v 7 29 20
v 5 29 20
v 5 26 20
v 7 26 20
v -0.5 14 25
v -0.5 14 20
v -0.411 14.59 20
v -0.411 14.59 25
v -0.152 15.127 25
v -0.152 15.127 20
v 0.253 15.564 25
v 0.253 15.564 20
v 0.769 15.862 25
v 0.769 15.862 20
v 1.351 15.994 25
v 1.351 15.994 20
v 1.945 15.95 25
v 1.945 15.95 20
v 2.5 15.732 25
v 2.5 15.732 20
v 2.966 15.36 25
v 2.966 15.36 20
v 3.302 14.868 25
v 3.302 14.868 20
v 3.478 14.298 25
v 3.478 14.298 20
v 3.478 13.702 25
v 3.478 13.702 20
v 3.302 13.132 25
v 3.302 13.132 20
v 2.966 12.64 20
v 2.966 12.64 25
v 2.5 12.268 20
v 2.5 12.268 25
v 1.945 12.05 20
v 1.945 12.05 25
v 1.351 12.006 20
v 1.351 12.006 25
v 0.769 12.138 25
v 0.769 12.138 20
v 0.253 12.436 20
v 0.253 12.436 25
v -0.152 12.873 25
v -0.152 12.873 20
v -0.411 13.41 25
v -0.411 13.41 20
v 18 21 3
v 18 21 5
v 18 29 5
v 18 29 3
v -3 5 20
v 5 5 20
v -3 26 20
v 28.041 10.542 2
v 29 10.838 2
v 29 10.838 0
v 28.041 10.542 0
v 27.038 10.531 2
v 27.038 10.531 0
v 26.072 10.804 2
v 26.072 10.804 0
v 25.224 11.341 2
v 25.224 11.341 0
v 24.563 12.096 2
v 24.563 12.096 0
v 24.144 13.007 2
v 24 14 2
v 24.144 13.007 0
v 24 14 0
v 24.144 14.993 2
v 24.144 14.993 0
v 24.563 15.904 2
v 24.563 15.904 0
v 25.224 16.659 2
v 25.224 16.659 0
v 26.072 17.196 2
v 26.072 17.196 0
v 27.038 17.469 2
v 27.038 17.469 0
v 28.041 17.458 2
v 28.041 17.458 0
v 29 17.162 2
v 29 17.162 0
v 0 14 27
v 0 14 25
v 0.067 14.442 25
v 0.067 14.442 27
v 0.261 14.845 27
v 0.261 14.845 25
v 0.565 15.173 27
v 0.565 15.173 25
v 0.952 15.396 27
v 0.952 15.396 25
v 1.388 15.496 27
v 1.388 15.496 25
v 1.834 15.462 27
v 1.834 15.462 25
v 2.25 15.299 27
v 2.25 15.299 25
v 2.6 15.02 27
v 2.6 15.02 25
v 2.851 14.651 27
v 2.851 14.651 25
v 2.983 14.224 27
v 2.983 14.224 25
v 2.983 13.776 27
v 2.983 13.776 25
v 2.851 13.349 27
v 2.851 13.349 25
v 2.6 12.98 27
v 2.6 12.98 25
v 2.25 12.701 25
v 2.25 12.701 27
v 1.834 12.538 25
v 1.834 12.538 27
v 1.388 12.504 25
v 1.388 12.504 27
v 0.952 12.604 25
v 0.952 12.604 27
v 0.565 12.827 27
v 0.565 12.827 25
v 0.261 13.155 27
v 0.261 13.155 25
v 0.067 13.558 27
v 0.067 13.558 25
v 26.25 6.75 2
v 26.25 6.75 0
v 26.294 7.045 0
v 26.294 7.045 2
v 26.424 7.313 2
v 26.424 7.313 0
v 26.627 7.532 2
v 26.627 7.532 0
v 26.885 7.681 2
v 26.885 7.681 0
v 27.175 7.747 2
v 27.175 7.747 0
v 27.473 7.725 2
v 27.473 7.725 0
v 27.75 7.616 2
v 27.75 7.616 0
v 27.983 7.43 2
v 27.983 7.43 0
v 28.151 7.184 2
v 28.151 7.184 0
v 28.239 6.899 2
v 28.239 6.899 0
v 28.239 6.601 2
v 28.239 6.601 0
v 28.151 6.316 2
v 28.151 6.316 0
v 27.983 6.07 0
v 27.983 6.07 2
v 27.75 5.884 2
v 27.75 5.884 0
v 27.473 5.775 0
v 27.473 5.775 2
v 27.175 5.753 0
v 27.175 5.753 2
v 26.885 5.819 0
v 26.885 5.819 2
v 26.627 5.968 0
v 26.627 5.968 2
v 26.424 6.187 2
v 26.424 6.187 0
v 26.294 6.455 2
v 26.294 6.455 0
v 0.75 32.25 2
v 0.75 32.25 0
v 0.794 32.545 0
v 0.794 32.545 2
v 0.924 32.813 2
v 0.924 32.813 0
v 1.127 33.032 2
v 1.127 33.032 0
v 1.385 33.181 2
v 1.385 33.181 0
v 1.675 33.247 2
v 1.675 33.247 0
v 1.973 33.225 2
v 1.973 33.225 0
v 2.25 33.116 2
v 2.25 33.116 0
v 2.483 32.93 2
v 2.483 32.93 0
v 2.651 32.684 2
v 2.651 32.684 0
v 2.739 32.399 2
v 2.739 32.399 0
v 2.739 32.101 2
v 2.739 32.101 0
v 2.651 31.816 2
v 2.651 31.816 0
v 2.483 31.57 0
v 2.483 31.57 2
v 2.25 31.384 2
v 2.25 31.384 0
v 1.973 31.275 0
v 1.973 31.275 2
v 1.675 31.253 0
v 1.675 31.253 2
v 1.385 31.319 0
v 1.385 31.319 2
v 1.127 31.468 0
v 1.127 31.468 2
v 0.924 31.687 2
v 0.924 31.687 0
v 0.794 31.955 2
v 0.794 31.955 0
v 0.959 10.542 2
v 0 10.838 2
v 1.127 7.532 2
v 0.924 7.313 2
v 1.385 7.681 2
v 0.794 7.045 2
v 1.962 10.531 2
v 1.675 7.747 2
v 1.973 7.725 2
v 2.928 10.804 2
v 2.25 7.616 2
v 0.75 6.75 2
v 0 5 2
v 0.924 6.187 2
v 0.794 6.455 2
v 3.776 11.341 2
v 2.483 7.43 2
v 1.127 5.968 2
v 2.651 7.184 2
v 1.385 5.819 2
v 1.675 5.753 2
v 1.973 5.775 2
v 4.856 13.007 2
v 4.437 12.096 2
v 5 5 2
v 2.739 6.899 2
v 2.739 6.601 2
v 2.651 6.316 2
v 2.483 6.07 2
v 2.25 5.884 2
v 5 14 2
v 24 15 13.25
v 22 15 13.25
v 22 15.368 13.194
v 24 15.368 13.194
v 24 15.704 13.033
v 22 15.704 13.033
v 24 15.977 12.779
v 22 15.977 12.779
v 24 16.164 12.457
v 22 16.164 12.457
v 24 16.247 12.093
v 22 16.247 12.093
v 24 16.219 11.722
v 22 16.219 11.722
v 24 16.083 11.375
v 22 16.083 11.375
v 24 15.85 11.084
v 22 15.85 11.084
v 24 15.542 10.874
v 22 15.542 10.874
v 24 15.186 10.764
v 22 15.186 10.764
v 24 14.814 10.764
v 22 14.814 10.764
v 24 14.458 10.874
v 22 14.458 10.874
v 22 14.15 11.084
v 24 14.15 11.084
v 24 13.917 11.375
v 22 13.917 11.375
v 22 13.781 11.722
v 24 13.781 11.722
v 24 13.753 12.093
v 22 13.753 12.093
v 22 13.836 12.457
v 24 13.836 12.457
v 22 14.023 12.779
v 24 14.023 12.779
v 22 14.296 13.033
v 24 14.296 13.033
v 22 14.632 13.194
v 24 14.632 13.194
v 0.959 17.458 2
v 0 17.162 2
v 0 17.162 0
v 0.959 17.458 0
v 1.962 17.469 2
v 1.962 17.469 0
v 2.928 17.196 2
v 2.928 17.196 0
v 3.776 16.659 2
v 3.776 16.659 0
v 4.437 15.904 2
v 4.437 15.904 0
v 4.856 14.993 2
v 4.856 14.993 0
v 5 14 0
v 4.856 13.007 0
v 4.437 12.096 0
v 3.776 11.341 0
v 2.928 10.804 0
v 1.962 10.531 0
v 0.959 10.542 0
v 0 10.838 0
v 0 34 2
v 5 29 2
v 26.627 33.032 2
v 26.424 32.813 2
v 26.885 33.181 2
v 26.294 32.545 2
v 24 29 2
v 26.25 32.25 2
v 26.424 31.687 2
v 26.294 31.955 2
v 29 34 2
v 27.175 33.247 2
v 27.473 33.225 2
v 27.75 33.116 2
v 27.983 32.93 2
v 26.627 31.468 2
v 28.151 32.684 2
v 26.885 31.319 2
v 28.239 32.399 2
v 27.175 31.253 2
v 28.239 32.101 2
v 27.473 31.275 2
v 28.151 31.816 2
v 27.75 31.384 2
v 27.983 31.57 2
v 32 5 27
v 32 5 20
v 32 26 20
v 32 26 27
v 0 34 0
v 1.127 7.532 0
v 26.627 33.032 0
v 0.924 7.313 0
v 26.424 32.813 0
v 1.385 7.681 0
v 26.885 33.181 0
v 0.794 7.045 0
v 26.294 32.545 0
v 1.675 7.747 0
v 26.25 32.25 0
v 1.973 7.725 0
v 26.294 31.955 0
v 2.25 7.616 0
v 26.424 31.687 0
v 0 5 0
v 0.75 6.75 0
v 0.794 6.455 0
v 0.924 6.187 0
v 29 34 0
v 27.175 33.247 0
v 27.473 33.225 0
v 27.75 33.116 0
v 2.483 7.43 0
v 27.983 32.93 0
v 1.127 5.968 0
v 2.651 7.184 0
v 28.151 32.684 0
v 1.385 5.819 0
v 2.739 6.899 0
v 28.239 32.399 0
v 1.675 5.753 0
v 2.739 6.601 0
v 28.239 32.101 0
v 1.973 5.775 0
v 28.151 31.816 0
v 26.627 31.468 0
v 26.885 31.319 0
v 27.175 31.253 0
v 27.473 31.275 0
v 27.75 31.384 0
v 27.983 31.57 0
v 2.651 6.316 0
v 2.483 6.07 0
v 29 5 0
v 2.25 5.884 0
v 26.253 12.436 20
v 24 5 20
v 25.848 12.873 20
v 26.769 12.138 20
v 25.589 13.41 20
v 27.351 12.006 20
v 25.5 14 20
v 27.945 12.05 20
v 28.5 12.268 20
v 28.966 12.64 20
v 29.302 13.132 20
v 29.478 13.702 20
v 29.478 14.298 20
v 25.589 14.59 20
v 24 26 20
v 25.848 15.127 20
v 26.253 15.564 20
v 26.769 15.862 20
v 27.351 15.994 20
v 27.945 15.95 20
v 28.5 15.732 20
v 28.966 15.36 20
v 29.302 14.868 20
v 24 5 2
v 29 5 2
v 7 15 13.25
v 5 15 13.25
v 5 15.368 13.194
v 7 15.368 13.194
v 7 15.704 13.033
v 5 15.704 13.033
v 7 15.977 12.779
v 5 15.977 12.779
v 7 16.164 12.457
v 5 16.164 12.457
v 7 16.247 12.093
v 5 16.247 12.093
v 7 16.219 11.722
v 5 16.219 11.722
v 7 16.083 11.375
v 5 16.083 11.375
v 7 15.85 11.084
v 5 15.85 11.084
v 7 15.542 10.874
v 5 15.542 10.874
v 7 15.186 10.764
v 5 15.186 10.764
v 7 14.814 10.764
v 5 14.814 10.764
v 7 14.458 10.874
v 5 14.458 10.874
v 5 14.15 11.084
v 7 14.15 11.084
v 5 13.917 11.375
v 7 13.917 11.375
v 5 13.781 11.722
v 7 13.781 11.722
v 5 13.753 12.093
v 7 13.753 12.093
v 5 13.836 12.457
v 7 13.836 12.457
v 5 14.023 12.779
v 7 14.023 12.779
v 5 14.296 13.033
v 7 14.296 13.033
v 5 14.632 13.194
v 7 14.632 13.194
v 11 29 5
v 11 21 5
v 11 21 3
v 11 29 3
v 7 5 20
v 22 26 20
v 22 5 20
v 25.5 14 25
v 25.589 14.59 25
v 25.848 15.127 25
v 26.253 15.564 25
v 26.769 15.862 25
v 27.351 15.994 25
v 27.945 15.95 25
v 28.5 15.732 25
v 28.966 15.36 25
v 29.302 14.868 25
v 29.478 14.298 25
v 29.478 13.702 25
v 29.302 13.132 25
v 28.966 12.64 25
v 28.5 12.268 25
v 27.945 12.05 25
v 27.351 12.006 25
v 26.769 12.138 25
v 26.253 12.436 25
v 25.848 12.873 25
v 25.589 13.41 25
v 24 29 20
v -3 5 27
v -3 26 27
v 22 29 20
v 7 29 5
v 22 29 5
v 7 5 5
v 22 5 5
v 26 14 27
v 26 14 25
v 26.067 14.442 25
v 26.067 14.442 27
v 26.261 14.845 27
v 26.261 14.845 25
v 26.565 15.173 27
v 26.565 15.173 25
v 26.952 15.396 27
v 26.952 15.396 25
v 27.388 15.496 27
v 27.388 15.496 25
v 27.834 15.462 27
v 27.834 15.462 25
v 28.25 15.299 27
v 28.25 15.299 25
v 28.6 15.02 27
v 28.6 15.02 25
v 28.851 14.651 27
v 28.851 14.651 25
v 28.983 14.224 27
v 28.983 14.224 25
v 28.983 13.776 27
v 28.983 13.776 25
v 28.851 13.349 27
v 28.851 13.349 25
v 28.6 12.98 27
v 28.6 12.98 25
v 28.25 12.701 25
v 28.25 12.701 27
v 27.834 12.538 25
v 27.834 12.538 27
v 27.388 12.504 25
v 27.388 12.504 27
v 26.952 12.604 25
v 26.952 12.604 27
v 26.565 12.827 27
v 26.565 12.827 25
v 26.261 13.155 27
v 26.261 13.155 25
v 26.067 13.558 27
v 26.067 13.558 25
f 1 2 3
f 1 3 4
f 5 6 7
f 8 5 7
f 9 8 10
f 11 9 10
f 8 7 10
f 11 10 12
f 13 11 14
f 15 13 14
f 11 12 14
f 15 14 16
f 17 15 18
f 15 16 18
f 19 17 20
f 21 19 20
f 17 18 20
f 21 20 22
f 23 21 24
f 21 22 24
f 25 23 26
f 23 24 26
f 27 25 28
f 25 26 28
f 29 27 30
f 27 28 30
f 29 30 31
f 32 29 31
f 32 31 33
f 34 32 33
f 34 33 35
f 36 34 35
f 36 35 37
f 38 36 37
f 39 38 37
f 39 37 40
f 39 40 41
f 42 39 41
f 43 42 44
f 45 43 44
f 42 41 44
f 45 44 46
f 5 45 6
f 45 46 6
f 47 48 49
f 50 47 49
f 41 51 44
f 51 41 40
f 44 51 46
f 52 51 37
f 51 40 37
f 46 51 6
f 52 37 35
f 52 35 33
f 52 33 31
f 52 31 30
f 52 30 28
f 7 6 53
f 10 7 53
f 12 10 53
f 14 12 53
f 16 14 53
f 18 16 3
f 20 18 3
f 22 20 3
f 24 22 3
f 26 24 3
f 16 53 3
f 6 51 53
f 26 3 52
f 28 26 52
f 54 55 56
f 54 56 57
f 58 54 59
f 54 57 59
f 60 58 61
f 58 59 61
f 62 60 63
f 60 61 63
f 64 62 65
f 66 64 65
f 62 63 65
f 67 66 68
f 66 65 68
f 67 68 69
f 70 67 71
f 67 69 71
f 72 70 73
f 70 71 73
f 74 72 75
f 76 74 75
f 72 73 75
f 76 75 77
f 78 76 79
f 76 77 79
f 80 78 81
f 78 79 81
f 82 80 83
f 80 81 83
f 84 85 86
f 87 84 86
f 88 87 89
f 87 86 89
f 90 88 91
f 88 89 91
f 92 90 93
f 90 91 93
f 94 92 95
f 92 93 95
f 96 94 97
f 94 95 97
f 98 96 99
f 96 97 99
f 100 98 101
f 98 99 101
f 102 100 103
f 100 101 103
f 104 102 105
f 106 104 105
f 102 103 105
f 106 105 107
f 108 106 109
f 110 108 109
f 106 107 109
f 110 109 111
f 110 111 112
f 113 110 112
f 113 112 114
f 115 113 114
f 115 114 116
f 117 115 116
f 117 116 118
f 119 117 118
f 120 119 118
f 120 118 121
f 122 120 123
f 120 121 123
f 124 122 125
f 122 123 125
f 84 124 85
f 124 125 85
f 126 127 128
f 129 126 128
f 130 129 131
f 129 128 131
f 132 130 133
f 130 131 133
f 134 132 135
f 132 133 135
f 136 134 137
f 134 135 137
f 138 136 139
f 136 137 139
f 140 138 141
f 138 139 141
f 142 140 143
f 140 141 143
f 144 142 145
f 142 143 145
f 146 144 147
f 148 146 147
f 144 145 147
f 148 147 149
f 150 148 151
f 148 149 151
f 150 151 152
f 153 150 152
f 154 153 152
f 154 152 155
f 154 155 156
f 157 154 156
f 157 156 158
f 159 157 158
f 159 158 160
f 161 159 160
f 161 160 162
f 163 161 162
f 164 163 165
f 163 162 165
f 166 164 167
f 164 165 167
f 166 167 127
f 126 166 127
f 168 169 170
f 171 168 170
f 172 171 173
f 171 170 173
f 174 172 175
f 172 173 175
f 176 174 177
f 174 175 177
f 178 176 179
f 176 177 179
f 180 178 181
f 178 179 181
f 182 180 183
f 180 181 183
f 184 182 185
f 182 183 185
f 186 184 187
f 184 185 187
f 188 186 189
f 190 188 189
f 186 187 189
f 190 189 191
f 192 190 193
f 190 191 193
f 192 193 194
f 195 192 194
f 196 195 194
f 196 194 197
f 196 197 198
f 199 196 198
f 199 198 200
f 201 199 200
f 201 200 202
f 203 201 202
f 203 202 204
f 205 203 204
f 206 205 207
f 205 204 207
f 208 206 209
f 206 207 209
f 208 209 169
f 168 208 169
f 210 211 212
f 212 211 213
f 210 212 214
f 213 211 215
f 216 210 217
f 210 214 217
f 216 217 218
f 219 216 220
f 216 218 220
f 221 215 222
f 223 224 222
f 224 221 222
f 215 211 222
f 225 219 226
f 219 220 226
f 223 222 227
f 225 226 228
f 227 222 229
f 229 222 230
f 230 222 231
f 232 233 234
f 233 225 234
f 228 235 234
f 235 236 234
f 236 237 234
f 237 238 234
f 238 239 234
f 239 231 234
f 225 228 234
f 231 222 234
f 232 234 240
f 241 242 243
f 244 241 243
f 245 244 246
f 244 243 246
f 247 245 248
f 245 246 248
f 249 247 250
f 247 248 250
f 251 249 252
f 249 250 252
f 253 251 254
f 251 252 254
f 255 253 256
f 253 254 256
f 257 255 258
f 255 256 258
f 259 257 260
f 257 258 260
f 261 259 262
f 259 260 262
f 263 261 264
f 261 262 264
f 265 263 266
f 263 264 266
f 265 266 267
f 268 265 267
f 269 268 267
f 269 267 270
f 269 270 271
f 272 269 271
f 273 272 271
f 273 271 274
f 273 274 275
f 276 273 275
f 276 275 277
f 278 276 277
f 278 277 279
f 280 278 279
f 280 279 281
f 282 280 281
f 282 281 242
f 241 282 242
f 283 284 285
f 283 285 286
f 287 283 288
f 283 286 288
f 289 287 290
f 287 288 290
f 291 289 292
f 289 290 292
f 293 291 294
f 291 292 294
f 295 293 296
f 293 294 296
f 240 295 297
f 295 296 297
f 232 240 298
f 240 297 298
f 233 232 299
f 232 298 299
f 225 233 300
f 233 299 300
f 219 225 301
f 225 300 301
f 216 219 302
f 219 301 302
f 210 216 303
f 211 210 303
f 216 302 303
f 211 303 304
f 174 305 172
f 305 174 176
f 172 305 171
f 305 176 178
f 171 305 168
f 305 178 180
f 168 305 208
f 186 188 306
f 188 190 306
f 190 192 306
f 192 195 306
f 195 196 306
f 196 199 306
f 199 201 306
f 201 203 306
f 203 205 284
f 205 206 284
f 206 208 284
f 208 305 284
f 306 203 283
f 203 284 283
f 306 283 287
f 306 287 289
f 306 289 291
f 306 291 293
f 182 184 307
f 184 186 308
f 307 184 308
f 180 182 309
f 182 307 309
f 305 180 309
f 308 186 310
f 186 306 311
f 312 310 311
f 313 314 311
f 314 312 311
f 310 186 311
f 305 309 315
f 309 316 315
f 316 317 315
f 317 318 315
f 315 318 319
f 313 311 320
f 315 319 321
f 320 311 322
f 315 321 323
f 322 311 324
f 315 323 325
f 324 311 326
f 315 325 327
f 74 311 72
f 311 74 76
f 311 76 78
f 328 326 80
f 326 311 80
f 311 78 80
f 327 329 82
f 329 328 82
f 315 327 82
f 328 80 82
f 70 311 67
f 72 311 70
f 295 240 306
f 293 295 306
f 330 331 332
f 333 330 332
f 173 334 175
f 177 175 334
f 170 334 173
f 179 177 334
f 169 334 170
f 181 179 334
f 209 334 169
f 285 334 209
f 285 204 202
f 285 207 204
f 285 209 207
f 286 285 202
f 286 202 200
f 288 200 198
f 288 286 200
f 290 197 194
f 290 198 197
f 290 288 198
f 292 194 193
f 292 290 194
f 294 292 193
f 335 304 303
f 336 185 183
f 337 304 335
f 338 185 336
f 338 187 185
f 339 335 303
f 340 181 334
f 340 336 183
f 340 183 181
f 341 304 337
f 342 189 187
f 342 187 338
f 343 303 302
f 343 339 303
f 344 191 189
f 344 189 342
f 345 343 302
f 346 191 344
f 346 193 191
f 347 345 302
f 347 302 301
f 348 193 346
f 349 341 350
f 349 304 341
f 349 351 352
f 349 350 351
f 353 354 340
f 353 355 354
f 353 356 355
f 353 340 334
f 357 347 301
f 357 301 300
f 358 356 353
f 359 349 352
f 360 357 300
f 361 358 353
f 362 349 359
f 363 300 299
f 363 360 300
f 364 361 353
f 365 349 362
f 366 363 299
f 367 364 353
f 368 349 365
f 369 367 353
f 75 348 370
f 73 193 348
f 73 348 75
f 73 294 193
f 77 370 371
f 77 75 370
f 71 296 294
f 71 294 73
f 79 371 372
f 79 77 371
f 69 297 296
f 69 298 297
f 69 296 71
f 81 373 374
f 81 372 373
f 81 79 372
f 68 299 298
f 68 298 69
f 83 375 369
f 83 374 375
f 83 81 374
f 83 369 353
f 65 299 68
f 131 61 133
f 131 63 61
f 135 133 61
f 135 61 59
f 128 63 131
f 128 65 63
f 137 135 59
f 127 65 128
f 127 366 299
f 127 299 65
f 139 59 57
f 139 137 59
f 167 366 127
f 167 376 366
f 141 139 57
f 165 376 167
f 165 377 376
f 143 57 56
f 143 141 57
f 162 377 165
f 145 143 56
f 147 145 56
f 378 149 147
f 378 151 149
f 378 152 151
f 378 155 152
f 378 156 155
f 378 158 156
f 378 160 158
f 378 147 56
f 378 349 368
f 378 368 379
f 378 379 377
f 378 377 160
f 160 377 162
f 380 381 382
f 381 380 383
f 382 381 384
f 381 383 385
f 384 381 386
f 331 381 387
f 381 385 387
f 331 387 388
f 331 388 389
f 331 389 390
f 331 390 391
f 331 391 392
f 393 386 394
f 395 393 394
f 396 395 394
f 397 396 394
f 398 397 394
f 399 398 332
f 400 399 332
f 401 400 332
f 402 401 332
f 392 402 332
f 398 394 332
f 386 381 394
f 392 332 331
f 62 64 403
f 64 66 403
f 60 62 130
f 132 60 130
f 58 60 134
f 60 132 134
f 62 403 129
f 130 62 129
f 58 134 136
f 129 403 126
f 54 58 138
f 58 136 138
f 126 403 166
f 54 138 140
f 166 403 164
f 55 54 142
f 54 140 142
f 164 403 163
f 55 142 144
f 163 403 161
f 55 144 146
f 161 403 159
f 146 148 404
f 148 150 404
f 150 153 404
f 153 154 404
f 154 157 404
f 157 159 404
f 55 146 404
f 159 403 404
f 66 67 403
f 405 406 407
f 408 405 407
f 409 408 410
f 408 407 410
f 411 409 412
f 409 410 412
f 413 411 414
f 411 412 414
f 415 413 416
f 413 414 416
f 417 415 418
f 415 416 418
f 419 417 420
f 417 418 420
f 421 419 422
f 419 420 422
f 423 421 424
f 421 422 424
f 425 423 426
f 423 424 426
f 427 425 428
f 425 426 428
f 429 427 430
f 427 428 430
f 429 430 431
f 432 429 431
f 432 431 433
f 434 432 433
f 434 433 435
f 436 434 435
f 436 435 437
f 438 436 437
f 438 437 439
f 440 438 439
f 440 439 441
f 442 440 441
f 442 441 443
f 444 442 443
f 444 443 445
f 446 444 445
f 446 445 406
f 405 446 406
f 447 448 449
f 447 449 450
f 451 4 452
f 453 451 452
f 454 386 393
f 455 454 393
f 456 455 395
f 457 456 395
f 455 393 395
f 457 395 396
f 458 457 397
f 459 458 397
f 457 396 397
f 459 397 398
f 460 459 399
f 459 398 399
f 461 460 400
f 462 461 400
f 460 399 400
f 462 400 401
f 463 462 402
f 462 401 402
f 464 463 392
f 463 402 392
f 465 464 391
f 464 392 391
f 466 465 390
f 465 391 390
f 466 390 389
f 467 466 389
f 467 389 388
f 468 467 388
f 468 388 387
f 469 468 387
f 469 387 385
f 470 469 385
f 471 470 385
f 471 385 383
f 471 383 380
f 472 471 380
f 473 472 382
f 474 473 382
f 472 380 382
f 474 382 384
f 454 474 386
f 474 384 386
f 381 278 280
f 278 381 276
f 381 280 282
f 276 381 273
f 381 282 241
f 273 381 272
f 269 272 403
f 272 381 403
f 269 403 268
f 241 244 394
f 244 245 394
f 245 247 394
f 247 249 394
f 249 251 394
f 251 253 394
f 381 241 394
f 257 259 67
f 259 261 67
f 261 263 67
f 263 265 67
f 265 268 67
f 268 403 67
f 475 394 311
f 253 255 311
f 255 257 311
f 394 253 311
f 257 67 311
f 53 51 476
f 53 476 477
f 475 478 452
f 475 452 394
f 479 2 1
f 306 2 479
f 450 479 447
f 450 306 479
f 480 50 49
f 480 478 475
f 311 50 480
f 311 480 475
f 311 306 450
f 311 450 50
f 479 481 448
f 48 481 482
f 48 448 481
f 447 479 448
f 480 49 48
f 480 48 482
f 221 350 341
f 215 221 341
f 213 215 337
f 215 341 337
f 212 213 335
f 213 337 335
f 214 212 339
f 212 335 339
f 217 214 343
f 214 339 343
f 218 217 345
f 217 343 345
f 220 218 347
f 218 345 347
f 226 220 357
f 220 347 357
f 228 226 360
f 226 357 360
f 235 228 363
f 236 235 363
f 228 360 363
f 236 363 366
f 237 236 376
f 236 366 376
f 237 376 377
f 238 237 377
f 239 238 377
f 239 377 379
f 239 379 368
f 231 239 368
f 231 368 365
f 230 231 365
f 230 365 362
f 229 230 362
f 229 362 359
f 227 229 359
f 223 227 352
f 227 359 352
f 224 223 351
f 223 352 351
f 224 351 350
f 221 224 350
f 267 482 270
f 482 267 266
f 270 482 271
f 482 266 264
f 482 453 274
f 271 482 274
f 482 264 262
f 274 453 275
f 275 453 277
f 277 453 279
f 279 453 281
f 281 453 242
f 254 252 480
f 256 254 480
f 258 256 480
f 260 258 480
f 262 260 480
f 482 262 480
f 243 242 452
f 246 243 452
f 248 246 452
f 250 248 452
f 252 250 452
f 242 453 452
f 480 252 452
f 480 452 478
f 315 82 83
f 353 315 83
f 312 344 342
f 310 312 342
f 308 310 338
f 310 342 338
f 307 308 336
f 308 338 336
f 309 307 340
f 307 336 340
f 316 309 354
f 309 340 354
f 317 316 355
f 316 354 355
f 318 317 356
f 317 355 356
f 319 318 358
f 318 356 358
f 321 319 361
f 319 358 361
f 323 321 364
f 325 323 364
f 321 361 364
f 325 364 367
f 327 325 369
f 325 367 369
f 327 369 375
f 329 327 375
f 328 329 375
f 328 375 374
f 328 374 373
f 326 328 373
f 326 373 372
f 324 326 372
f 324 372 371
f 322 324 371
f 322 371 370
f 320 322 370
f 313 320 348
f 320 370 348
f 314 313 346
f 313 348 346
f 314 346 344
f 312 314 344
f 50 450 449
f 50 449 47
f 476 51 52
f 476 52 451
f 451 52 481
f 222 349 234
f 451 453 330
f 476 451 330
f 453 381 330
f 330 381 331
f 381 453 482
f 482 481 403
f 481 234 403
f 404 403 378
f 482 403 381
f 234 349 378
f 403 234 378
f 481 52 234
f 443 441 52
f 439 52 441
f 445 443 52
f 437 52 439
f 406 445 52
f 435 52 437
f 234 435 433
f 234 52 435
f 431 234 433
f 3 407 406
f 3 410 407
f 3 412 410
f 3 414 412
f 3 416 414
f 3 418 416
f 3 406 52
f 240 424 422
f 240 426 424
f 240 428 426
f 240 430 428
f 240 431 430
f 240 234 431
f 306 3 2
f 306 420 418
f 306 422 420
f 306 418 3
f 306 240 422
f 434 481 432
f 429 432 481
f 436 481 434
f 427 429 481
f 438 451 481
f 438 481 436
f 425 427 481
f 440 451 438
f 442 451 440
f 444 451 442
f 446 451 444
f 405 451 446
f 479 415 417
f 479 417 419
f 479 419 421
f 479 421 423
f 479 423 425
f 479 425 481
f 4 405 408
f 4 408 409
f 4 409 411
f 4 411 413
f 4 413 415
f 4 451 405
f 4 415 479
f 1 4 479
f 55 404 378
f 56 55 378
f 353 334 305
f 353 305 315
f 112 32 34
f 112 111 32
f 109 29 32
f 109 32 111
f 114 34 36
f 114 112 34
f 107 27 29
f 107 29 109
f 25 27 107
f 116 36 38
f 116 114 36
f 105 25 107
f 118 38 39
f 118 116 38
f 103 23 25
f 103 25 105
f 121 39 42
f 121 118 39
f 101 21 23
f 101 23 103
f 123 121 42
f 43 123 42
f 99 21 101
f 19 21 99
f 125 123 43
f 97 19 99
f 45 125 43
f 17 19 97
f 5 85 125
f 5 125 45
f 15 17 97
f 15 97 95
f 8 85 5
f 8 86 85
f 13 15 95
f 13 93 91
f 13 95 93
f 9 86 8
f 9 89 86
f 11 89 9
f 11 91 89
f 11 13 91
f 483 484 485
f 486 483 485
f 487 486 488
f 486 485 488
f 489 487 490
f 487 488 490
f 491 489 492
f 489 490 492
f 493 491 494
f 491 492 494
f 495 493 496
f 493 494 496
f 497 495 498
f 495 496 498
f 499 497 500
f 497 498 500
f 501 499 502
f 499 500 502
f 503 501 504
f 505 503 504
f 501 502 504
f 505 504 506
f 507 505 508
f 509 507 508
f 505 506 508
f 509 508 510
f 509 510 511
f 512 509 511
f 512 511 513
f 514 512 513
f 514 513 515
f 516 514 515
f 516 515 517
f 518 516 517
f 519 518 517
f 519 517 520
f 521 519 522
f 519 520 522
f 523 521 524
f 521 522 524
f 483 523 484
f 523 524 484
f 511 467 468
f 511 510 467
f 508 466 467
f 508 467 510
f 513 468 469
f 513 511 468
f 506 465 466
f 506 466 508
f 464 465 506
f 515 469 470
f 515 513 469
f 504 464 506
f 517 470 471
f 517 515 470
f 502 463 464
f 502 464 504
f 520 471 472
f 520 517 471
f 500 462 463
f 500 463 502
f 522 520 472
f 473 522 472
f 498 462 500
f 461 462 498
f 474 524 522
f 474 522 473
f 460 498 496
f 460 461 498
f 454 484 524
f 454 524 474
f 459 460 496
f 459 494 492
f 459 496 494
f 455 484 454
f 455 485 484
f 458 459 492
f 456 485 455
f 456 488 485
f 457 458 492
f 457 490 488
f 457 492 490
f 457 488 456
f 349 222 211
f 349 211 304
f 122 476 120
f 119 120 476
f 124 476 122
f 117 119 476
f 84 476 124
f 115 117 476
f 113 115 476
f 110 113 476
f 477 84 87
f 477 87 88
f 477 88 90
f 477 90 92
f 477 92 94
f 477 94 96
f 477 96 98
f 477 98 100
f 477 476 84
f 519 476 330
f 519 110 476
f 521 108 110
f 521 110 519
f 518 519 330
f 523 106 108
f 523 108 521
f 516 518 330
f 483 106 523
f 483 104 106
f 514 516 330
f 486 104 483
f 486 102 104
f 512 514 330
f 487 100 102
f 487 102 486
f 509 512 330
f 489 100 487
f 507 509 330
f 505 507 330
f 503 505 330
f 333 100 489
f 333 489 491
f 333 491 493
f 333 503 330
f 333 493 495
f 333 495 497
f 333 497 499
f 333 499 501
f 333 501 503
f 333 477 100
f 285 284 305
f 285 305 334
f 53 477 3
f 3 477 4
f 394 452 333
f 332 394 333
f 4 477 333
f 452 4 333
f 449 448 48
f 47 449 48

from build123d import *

# Parameters (mm, degrees)
AUFSATZ_LINEAR_AUSTRAGEN1_OUTLINE_W = 29
AUFSATZ_LINEAR_AUSTRAGEN1_OUTLINE_H = 29
AUFSATZ_LINEAR_AUSTRAGEN1_DEPTH     = 2
SKIZZE2_W                           = 19
SKIZZE2_H                           = 24
AUFSATZ_LINEAR_AUSTRAGEN2_DEPTH     = 18
SKIZZE5_W                           = 15
SKIZZE5_H                           = 24
SCHNITT_LINEAR_AUSTRAGEN2_DEPTH     = 15
SCHNITT_LINEAR_AUSTRAGEN3_REACH     = 44.626
SKIZZE4_R                           = 1.25
SKIZZE6_W                           = 35
SKIZZE6_H                           = 24
AUFSATZ_LINEAR_AUSTRAGEN3_DEPTH     = 7
SKIZZE9_R                           = 2
SCHNITT_LINEAR_AUSTRAGEN4_DEPTH     = 5
SKIZZE19_W                          = 17
SKIZZE19_H                          = 5
SCHNITT_LINEAR_AUSTRAGEN15_DEPTH    = 2
SKIZZE20_R                          = 1.5
SCHNITT_LINEAR_AUSTRAGEN16_DEPTH    = 2
SKIZZE21_W                          = 7
SKIZZE21_H                          = 8
SCHNITT_LINEAR_AUSTRAGEN17_DEPTH    = 2
SKIZZE23_W                          = 6.5
SKIZZE23_H                          = 5
SKIZZE23_W_2                        = 5.5
SCHNITT_LINEAR_AUSTRAGEN18_DEPTH    = 2
SKIZZE24_W                          = 29
SKIZZE24_H                          = 2
AUFSATZ_LINEAR_AUSTRAGEN4_DEPTH     = 5
SKIZZE25_R                          = 1
SCHNITT_LINEAR_AUSTRAGEN19_DEPTH    = 2
SKIZZE26_W                          = 35
SKIZZE26_H                          = 3
SCHNITT_LINEAR_AUSTRAGEN20_DEPTH    = 7
SKIZZE27_R                          = 3.5
SCHNITT_LINEAR_AUSTRAGEN21_DEPTH    = 2


# Read off the part's stored shape, not the designer's step: Aufsatz-Linear austragen1
with BuildPart() as part:
    # Aufsatz-Linear austragen1 outline → Aufsatz-Linear austragen1 (new body)
    with BuildSketch(Plane.XY):
        with Locations((14.5, 14.5)):
            Rectangle(AUFSATZ_LINEAR_AUSTRAGEN1_OUTLINE_W, AUFSATZ_LINEAR_AUSTRAGEN1_OUTLINE_H)
    extrude(amount=AUFSATZ_LINEAR_AUSTRAGEN1_DEPTH)

    # Skizze2 → Aufsatz-Linear austragen2 (add)
    with BuildSketch(Plane.XY.offset(2)):
        with Locations((14.5, 17)):
            Rectangle(SKIZZE2_W, SKIZZE2_H)
    extrude(amount=AUFSATZ_LINEAR_AUSTRAGEN2_DEPTH)

    # Skizze5 → Schnitt-Linear austragen2 (cut)
    with BuildSketch(Plane.XY.offset(20)):
        with Locations((14.5, 17)):
            Rectangle(SKIZZE5_W, SKIZZE5_H)
    extrude(amount=-SCHNITT_LINEAR_AUSTRAGEN2_DEPTH, mode=Mode.SUBTRACT)

    # Schnitt-Linear austragen3: up to this face of the body (flat: up to its plane)
    schnitt_linear_austragen3_end = Plane(part.part.faces().sort_by_distance((24, 17, 11))[0])
    # Skizze4 → Schnitt-Linear austragen3 (cut, up to the picked face)
    with BuildSketch(Plane.ZY.offset(-5), mode=Mode.PRIVATE) as schnitt_linear_austragen3_sk1:
        with Locations((12, 15)):
            Circle(SKIZZE4_R)
    schnitt_linear_austragen3_tool1 = split(extrude(schnitt_linear_austragen3_sk1.sketch, amount=-SCHNITT_LINEAR_AUSTRAGEN3_REACH, mode=Mode.PRIVATE), bisect_by=schnitt_linear_austragen3_end, keep=Keep.BOTH, mode=Mode.PRIVATE)
    add(schnitt_linear_austragen3_tool1.solids().sort_by(Axis((5, 15, 12), (1, 0, 0)))[0], mode=Mode.SUBTRACT)

    # Skizze6 → Aufsatz-Linear austragen3 (add)
    with BuildSketch(Plane.XY.offset(20)):
        with Locations((14.5, 17)):
            Rectangle(SKIZZE6_W, SKIZZE6_H)
    extrude(amount=AUFSATZ_LINEAR_AUSTRAGEN3_DEPTH)

    # Skizze9 → Schnitt-Linear austragen4 (cut)
    with BuildSketch(Plane(origin=(0, 0, 20), x_dir=(-1, 0, 0), z_dir=(0, 0, -1))):
        with Locations((-1.5, 14)):
            Circle(SKIZZE9_R)
        with Locations((-27.5, 14)):
            Circle(SKIZZE9_R)
    extrude(amount=-SCHNITT_LINEAR_AUSTRAGEN4_DEPTH, mode=Mode.SUBTRACT)

    # Skizze19 → Schnitt-Linear austragen15 (cut)
    with BuildSketch(Plane(origin=(0, 0, 0), x_dir=(-1, 0, 0), z_dir=(0, 0, -1))):
        with Locations((-14, 2.5)):
            Rectangle(SKIZZE19_W, SKIZZE19_H)
    extrude(amount=-SCHNITT_LINEAR_AUSTRAGEN15_DEPTH, mode=Mode.SUBTRACT)

    # Skizze20 → Schnitt-Linear austragen16 (cut)
    with BuildSketch(Plane(origin=(0, 0, 25), x_dir=(-1, 0, 0), z_dir=(0, 0, -1))):
        with Locations((-27.5, 14)):
            Circle(SKIZZE20_R)
        with Locations((-1.5, 14)):
            Circle(SKIZZE20_R)
    extrude(amount=-SCHNITT_LINEAR_AUSTRAGEN16_DEPTH, mode=Mode.SUBTRACT)

    # Skizze21 → Schnitt-Linear austragen17 (cut)
    with BuildSketch(Plane.XY.offset(5)):
        with Locations((14.5, 25)):
            Rectangle(SKIZZE21_W, SKIZZE21_H)
    extrude(amount=-SCHNITT_LINEAR_AUSTRAGEN17_DEPTH, mode=Mode.SUBTRACT)

    # Skizze23 → Schnitt-Linear austragen18 (cut)
    with BuildSketch(Plane(origin=(0, 0, 0), x_dir=(-1, 0, 0), z_dir=(0, 0, -1))):
        with Locations((-25.75, 2.5)):
            Rectangle(SKIZZE23_W, SKIZZE23_H)
        with Locations((-2.75, 2.5)):
            Rectangle(SKIZZE23_W_2, SKIZZE23_H)
    extrude(amount=-SCHNITT_LINEAR_AUSTRAGEN18_DEPTH, mode=Mode.SUBTRACT)

    # Skizze24 → Aufsatz-Linear austragen4 (add)
    with BuildSketch(Plane(origin=(0, 29, 0), x_dir=(1, 0, 0), z_dir=(0, 1, 0))):
        with Locations((14.5, -1)):
            Rectangle(SKIZZE24_W, SKIZZE24_H)
    extrude(amount=AUFSATZ_LINEAR_AUSTRAGEN4_DEPTH)

    # Skizze25 → Schnitt-Linear austragen19 (cut)
    with BuildSketch(Plane(origin=(0, 0, 0), x_dir=(-1, 0, 0), z_dir=(0, 0, -1))):
        with Locations((-1.75, 32.25)):
            Circle(SKIZZE25_R)
        with Locations((-27.25, 32.25)):
            Circle(SKIZZE25_R)
        with Locations((-27.25, 6.75)):
            Circle(SKIZZE25_R)
        with Locations((-1.75, 6.75)):
            Circle(SKIZZE25_R)
    extrude(amount=-SCHNITT_LINEAR_AUSTRAGEN19_DEPTH, mode=Mode.SUBTRACT)

    # Skizze26 → Schnitt-Linear austragen20 (cut)
    with BuildSketch(Plane.XY.offset(27)):
        with Locations((14.5, 27.5)):
            Rectangle(SKIZZE26_W, SKIZZE26_H)
    extrude(amount=-SCHNITT_LINEAR_AUSTRAGEN20_DEPTH, mode=Mode.SUBTRACT)

    # Skizze27 → Schnitt-Linear austragen21 (cut)
    with BuildSketch(Plane(origin=(0, 0, 0), x_dir=(-1, 0, 0), z_dir=(0, 0, -1))):
        with Locations((-27.5, 14)):
            Circle(SKIZZE27_R)
        with Locations((-1.5, 14)):
            Circle(SKIZZE27_R)
    extrude(amount=-SCHNITT_LINEAR_AUSTRAGEN21_DEPTH, mode=Mode.SUBTRACT)


solid = part.part
